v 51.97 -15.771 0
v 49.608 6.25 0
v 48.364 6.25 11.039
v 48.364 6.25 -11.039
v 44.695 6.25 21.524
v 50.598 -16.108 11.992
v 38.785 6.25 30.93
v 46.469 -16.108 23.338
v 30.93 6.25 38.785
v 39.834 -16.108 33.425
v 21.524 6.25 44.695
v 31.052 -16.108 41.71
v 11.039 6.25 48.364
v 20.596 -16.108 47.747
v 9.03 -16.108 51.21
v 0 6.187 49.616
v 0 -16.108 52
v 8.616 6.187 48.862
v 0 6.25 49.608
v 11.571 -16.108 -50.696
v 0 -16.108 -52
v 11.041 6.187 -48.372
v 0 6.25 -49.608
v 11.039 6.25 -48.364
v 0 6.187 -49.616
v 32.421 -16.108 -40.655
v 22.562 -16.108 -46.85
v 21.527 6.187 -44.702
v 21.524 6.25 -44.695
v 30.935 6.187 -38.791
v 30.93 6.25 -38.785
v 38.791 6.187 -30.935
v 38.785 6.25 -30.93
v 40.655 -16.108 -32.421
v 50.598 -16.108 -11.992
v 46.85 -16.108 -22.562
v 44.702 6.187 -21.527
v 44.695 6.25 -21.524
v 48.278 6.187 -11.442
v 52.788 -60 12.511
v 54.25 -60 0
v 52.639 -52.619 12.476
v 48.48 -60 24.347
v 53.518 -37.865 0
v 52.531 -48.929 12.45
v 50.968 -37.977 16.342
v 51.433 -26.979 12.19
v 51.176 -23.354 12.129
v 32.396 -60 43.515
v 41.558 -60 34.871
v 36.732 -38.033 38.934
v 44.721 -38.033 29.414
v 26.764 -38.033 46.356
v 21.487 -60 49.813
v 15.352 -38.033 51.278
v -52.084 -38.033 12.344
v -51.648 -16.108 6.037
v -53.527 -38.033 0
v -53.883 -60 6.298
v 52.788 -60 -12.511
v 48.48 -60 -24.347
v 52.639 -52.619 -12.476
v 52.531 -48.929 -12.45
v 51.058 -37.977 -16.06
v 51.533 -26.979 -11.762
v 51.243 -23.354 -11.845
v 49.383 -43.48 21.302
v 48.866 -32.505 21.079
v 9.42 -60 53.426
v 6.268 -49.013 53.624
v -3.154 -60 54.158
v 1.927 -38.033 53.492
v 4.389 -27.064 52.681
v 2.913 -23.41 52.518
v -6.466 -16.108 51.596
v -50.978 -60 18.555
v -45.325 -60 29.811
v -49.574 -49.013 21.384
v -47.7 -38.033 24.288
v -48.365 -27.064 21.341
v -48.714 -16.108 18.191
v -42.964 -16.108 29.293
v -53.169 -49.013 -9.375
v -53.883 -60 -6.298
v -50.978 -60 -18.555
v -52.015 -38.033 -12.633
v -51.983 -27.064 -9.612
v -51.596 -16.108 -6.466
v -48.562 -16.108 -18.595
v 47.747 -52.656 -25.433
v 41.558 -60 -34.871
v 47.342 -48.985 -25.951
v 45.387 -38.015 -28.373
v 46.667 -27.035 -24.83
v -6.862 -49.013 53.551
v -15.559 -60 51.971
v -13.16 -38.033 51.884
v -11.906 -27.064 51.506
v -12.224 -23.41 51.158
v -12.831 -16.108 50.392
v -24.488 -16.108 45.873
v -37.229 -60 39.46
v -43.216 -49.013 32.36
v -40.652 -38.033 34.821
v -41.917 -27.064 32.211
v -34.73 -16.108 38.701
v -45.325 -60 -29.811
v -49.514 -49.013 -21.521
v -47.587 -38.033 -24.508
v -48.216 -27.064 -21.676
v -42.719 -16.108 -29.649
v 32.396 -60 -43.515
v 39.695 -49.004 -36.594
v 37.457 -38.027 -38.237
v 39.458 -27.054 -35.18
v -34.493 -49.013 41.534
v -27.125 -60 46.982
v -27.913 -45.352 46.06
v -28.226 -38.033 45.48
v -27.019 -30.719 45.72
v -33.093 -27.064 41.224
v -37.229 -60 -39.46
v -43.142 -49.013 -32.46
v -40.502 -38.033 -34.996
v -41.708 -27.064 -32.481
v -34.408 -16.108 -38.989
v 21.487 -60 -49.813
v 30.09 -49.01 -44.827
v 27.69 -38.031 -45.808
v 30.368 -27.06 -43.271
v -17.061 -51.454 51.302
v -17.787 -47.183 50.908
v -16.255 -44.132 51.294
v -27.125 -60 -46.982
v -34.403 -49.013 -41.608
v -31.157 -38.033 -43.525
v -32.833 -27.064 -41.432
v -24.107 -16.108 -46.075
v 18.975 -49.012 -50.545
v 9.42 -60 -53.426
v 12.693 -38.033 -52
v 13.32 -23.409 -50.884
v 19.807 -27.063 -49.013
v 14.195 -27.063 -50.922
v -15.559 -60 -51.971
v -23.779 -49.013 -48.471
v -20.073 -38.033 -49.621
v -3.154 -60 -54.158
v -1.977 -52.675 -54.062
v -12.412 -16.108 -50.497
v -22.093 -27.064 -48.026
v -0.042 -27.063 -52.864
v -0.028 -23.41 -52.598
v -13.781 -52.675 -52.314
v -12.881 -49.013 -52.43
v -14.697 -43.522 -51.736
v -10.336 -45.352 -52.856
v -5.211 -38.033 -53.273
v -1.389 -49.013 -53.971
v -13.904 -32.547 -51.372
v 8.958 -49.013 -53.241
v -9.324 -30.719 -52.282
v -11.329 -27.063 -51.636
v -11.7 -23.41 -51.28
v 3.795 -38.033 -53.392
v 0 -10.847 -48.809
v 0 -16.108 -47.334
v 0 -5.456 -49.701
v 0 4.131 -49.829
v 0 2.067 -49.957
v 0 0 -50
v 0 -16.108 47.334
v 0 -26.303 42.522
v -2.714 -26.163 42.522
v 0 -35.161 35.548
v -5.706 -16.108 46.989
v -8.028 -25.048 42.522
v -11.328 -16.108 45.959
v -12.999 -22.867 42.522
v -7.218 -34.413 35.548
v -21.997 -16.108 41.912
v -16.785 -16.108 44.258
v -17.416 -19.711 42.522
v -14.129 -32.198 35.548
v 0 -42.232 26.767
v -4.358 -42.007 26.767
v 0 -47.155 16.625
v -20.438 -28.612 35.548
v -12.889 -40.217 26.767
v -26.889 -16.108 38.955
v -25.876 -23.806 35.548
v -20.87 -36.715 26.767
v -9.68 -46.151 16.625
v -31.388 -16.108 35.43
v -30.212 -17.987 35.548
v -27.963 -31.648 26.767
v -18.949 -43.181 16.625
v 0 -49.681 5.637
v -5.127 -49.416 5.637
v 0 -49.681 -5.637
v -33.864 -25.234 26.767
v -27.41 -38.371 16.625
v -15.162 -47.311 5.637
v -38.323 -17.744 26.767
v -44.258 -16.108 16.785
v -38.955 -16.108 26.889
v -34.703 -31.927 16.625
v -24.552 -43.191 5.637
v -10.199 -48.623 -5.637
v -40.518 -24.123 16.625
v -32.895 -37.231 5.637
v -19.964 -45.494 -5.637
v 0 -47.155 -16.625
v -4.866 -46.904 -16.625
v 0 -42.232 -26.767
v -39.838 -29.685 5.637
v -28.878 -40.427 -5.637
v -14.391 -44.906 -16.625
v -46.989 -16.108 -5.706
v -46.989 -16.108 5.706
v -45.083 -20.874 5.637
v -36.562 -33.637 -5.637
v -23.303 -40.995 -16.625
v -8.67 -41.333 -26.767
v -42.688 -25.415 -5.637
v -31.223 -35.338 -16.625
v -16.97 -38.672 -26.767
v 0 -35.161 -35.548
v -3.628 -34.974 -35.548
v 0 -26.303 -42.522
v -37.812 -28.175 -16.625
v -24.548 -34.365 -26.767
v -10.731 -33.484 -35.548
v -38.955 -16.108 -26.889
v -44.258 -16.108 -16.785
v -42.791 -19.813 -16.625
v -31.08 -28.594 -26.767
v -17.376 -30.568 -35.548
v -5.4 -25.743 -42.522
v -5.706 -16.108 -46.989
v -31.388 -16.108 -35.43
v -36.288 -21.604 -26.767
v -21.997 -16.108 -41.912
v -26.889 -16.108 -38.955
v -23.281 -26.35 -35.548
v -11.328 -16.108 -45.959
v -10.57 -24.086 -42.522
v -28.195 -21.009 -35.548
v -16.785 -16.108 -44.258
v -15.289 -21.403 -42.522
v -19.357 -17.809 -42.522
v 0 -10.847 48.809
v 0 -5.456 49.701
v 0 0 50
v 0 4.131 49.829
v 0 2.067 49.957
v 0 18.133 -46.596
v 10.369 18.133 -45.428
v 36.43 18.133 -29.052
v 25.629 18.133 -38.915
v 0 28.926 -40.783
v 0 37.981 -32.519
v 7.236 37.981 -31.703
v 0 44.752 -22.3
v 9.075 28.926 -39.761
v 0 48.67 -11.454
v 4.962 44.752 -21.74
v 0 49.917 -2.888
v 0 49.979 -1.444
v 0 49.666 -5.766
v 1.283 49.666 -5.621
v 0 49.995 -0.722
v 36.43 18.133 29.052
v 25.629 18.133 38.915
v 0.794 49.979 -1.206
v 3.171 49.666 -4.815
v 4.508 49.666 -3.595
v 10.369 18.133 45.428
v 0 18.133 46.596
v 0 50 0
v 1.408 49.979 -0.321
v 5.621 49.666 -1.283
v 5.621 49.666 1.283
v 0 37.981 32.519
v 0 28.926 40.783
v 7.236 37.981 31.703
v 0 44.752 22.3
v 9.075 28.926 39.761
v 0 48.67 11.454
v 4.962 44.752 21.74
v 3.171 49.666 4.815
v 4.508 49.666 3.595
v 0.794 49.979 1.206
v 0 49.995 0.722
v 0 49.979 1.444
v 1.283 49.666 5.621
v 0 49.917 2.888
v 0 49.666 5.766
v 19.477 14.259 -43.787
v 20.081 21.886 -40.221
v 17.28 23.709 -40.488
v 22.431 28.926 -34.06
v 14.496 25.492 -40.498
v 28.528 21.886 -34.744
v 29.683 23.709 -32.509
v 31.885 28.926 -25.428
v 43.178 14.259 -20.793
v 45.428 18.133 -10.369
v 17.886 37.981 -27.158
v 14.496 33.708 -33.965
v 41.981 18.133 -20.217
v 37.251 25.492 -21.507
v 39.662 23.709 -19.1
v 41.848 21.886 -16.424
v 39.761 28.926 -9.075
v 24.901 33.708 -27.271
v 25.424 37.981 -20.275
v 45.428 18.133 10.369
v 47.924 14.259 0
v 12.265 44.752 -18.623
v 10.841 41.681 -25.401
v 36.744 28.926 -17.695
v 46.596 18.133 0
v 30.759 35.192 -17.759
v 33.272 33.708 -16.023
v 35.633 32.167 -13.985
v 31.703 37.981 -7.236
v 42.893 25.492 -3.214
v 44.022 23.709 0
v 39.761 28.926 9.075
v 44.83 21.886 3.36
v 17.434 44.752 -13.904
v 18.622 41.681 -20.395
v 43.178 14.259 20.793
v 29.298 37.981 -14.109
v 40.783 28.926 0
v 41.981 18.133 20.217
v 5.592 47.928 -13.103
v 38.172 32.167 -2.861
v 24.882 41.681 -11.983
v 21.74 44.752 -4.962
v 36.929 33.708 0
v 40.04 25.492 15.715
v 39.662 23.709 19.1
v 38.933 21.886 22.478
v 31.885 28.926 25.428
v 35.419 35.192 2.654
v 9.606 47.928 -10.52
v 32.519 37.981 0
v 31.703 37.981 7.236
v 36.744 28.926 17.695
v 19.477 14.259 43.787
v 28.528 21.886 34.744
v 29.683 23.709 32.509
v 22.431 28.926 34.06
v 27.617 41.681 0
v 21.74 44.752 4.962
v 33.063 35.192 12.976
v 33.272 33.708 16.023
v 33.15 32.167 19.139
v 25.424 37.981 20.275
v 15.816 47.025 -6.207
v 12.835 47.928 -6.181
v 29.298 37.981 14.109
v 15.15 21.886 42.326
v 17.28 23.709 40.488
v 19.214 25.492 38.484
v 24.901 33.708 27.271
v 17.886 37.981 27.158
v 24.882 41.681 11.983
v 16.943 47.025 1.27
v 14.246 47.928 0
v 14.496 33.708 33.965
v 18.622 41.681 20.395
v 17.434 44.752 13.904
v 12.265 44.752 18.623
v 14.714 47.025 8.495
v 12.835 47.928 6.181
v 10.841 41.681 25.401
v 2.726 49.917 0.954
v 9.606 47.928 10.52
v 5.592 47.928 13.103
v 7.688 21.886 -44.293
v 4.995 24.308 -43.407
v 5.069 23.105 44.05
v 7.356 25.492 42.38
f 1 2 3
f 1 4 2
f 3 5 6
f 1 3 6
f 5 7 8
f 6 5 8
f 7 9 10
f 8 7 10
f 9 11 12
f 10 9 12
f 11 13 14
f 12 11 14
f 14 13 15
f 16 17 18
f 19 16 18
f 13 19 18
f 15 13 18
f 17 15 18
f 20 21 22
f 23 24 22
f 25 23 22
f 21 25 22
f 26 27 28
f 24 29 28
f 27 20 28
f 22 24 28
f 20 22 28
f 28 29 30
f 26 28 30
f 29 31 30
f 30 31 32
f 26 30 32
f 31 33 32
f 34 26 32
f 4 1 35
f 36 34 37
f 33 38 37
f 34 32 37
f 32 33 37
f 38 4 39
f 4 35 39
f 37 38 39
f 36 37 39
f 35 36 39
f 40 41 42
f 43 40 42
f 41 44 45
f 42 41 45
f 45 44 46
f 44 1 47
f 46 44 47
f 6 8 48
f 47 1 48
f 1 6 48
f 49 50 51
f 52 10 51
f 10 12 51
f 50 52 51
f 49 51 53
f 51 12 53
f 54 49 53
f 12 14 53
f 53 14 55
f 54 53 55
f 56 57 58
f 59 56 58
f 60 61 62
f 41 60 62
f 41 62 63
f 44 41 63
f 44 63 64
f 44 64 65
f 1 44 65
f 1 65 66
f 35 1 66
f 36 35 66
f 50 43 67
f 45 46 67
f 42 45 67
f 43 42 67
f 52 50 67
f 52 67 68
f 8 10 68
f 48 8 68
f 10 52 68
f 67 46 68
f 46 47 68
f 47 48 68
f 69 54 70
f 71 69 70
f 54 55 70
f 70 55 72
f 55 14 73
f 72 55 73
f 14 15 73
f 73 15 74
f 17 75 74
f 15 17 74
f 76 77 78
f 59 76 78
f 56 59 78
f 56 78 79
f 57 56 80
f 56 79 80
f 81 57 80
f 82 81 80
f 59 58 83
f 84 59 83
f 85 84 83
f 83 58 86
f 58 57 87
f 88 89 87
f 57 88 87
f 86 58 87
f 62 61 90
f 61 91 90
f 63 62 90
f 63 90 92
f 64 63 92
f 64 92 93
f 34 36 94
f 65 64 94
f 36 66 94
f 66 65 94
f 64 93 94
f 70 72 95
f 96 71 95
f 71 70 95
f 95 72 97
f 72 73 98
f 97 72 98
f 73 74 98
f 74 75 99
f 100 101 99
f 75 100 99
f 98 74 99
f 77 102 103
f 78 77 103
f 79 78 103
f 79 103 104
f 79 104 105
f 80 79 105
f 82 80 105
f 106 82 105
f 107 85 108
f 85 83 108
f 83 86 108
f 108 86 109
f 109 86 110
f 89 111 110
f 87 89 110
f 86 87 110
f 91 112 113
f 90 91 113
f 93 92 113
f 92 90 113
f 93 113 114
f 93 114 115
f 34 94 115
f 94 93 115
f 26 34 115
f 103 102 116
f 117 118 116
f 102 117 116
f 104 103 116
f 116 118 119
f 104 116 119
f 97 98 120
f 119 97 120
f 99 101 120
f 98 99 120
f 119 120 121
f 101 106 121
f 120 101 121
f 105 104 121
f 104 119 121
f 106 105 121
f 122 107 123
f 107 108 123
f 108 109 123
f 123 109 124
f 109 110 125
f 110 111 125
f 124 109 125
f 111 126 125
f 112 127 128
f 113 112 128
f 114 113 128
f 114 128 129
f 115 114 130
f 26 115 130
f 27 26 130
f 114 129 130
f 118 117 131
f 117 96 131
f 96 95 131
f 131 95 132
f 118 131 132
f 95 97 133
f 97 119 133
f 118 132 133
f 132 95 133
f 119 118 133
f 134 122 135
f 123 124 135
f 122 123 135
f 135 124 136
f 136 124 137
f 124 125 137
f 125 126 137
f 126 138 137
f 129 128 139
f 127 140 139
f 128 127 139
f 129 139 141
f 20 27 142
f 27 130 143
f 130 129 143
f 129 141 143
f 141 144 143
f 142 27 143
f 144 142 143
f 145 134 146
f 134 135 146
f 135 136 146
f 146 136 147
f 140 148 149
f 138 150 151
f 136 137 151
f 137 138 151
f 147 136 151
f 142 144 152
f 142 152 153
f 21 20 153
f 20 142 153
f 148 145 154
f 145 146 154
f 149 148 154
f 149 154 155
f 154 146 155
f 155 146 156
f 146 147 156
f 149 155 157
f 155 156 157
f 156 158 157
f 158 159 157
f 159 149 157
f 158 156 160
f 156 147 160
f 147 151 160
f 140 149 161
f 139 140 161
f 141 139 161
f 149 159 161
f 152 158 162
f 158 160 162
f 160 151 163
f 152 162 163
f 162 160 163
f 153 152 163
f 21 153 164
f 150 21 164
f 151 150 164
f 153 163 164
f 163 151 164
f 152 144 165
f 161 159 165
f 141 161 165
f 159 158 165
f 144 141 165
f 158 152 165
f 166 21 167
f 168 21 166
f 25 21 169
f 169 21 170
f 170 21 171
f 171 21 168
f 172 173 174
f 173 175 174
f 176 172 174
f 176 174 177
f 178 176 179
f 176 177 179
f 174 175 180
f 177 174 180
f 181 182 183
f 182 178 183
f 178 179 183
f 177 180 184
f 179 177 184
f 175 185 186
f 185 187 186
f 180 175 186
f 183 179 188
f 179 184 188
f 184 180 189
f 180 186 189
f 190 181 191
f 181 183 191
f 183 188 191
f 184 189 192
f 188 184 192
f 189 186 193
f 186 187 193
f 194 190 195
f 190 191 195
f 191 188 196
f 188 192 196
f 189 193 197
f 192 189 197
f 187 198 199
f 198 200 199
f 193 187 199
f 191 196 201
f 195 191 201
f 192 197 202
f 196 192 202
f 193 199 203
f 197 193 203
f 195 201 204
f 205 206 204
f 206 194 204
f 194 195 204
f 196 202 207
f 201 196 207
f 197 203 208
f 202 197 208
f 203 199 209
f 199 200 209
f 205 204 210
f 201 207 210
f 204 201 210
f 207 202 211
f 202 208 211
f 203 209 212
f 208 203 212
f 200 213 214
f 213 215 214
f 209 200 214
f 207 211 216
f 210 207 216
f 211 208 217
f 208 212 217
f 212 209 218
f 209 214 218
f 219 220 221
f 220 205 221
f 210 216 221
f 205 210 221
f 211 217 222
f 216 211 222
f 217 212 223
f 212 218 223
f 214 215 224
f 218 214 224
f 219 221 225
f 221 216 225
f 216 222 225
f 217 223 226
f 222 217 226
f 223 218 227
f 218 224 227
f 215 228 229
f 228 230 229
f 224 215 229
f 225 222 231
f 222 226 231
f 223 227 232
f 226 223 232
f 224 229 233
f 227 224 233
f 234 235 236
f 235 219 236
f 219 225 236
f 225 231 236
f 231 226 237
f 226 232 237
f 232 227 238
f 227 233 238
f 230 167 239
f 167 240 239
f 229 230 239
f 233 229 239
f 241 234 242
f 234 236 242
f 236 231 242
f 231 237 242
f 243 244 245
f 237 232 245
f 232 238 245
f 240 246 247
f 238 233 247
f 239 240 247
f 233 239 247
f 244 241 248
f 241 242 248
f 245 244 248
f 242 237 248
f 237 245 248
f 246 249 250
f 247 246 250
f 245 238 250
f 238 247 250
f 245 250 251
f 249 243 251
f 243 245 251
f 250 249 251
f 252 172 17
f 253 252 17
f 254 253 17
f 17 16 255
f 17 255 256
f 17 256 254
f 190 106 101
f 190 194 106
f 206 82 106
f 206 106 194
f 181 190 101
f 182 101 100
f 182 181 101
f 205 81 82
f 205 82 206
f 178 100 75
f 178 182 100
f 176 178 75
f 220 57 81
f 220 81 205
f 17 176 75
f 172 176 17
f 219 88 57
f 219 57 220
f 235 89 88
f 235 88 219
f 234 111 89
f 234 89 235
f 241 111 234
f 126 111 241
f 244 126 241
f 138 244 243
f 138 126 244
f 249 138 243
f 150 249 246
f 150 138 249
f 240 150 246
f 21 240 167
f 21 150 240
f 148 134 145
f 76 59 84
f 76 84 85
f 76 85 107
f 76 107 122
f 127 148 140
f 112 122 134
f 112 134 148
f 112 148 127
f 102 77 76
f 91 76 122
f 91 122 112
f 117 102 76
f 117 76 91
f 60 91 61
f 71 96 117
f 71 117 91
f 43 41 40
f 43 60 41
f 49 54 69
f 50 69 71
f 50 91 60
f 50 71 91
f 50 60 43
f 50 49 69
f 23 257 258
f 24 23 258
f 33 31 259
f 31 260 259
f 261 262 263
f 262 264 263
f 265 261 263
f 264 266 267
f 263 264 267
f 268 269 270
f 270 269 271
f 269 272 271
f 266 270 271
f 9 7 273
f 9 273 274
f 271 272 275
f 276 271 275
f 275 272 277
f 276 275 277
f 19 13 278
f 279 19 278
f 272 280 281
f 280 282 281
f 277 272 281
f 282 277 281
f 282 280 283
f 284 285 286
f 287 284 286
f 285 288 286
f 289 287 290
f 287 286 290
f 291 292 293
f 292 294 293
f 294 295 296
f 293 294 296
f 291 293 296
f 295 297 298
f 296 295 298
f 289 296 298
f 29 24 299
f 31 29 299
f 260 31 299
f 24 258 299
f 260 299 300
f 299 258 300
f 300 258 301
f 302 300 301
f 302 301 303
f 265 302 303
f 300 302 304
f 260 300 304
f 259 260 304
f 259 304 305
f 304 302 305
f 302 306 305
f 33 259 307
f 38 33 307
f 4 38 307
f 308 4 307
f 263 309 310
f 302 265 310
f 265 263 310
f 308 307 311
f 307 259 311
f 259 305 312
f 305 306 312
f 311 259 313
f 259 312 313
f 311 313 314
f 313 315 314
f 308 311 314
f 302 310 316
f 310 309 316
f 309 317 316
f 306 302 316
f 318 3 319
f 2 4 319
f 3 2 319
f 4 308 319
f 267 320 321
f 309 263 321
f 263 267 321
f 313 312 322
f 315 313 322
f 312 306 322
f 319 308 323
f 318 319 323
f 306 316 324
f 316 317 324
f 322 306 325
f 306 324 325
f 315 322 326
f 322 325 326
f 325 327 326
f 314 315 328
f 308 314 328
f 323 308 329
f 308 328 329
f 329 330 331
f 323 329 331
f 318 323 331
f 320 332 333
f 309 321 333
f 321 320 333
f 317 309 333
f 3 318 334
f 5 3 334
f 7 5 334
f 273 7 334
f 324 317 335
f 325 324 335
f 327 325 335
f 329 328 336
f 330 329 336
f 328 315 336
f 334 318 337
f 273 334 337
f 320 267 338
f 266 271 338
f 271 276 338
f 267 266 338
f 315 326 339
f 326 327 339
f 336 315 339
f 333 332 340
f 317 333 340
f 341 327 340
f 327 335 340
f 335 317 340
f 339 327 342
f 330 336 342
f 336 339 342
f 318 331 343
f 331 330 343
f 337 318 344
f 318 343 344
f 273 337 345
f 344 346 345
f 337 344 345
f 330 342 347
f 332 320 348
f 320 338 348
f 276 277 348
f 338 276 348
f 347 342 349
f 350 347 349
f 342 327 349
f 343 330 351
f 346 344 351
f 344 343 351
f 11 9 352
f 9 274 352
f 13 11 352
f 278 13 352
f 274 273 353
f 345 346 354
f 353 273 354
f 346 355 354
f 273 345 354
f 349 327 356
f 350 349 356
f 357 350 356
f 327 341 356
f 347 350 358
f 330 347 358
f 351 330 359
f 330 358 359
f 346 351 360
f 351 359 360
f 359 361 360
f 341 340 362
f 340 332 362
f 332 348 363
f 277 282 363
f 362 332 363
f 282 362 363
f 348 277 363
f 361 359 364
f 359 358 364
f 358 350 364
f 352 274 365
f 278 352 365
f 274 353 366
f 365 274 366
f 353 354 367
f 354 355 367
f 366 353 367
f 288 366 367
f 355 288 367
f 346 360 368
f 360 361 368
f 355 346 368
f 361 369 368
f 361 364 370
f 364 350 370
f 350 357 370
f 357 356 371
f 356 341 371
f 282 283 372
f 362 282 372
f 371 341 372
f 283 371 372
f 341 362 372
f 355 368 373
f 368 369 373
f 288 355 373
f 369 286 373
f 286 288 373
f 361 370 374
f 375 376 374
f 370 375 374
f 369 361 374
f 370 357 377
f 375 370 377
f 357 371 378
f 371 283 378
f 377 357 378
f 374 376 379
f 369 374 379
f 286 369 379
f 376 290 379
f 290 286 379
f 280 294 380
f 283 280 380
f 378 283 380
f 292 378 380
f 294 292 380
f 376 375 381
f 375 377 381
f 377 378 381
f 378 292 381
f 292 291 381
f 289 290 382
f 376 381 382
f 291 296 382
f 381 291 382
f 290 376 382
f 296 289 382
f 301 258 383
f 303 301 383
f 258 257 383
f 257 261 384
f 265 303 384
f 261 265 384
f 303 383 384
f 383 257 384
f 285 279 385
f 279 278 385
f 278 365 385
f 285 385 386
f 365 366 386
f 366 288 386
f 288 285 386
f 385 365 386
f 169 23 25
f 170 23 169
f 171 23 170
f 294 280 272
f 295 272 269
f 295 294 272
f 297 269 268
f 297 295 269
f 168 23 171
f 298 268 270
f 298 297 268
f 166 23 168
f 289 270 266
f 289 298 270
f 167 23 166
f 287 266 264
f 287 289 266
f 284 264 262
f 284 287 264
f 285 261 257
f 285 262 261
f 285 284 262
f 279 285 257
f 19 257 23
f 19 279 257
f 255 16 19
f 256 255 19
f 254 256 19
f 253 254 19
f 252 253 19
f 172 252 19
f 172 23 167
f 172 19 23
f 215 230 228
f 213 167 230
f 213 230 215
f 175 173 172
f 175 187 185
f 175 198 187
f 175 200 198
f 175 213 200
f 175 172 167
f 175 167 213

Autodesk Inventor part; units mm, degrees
ref_plane "YZ Plane" through (0, 0, 0) normal (1, 0, 0) x (0, 1, 0)
ref_plane "XZ Plane" through (0, 0, 0) normal (0, 1, 0) x (-1, 0, 0)
ref_plane "XY Plane" through (0, 0, 0) normal (0, 0, 1) x (1, 0, 0)
sketch "Эскиз1" plane through (0, 0, 0) normal (0, 0, 1) x (1, 0, 0)
  arc A0 (49.6078, 6.25) -> (0, 50) centre (0, 0) ccw
  line L0 (0, 0) -> (0, -250)
  circle A1 centre (0, -250) radius 25
  arc A2 (23.7255, -257.8804) -> (54.25, -60) centre (-545.6862, -68.75) ccw construction
  line L1 (54.25, -60) -> (0, -60)
  arc A3 (0, -50) -> (49.6078, 6.25) centre (0, 0) ccw construction
  line L2 (0, 0) -> (0, 50)
  arc A4 (0, 50) -> (0, -50) centre (0, 0) ccw construction
  arc A5 (54.25, -60) -> (49.6078, 6.25) centre (-545.6862, -68.75) ccw
  dimension "d2" = 50
  dimension "d0" = 100
  dimension "d1" = 250
  dimension "d3" = 600
  dimension "d4" = 60
revolve "Вращение1" add sketch "Эскиз1" angle 360 about axis through (0, 0, 0) along (0, -1, 0) contours A5 L1 L0 L2 A0
sketch "Эскиз2" plane through (0, 0, 0) normal (1, 0, 0) x (0, 1, 0)
  line L0 (6.25, 49.6078) -> (6.25, -49.6078) construction
  arc A0 (0, -50) -> (0, 50) centre (0, 0) ccw construction
  line L1 (0, -50) -> (0, 50)
  arc A1 (0, 50) -> (0, -50) centre (0, 0) ccw
  dimension "d6" = 100
revolve "Вращение2" cut sketch "Эскиз2" angle 180 about axis through (0, 0, -50) along (0, 0, -1)
sketch "Эскиз3" plane through (0, 0, 0) normal (0, 0, 1) x (1, 0, 0)
  line L0 (0, 6.25) -> (0, 50) projected
  arc A0 (-49.6078, 6.25) -> (-54.25, -60) centre (545.6862, -68.75) ccw projected
  line L1 (0, 50) -> (-52, 50)
  line L2 (-52, 50) -> (-52, -16.1078)
  line L3 (-52, -16.1078) -> (0, -16.1078)
  line L4 (0, -16.1078) -> (0, 50)
  point P0 (0, 0)
  dimension "d11" = 52
extrude "Выдавливание1" cut sketch "Эскиз3" along normal through all both and the other way through all
properties part number "ч ASY human dummy 01"
